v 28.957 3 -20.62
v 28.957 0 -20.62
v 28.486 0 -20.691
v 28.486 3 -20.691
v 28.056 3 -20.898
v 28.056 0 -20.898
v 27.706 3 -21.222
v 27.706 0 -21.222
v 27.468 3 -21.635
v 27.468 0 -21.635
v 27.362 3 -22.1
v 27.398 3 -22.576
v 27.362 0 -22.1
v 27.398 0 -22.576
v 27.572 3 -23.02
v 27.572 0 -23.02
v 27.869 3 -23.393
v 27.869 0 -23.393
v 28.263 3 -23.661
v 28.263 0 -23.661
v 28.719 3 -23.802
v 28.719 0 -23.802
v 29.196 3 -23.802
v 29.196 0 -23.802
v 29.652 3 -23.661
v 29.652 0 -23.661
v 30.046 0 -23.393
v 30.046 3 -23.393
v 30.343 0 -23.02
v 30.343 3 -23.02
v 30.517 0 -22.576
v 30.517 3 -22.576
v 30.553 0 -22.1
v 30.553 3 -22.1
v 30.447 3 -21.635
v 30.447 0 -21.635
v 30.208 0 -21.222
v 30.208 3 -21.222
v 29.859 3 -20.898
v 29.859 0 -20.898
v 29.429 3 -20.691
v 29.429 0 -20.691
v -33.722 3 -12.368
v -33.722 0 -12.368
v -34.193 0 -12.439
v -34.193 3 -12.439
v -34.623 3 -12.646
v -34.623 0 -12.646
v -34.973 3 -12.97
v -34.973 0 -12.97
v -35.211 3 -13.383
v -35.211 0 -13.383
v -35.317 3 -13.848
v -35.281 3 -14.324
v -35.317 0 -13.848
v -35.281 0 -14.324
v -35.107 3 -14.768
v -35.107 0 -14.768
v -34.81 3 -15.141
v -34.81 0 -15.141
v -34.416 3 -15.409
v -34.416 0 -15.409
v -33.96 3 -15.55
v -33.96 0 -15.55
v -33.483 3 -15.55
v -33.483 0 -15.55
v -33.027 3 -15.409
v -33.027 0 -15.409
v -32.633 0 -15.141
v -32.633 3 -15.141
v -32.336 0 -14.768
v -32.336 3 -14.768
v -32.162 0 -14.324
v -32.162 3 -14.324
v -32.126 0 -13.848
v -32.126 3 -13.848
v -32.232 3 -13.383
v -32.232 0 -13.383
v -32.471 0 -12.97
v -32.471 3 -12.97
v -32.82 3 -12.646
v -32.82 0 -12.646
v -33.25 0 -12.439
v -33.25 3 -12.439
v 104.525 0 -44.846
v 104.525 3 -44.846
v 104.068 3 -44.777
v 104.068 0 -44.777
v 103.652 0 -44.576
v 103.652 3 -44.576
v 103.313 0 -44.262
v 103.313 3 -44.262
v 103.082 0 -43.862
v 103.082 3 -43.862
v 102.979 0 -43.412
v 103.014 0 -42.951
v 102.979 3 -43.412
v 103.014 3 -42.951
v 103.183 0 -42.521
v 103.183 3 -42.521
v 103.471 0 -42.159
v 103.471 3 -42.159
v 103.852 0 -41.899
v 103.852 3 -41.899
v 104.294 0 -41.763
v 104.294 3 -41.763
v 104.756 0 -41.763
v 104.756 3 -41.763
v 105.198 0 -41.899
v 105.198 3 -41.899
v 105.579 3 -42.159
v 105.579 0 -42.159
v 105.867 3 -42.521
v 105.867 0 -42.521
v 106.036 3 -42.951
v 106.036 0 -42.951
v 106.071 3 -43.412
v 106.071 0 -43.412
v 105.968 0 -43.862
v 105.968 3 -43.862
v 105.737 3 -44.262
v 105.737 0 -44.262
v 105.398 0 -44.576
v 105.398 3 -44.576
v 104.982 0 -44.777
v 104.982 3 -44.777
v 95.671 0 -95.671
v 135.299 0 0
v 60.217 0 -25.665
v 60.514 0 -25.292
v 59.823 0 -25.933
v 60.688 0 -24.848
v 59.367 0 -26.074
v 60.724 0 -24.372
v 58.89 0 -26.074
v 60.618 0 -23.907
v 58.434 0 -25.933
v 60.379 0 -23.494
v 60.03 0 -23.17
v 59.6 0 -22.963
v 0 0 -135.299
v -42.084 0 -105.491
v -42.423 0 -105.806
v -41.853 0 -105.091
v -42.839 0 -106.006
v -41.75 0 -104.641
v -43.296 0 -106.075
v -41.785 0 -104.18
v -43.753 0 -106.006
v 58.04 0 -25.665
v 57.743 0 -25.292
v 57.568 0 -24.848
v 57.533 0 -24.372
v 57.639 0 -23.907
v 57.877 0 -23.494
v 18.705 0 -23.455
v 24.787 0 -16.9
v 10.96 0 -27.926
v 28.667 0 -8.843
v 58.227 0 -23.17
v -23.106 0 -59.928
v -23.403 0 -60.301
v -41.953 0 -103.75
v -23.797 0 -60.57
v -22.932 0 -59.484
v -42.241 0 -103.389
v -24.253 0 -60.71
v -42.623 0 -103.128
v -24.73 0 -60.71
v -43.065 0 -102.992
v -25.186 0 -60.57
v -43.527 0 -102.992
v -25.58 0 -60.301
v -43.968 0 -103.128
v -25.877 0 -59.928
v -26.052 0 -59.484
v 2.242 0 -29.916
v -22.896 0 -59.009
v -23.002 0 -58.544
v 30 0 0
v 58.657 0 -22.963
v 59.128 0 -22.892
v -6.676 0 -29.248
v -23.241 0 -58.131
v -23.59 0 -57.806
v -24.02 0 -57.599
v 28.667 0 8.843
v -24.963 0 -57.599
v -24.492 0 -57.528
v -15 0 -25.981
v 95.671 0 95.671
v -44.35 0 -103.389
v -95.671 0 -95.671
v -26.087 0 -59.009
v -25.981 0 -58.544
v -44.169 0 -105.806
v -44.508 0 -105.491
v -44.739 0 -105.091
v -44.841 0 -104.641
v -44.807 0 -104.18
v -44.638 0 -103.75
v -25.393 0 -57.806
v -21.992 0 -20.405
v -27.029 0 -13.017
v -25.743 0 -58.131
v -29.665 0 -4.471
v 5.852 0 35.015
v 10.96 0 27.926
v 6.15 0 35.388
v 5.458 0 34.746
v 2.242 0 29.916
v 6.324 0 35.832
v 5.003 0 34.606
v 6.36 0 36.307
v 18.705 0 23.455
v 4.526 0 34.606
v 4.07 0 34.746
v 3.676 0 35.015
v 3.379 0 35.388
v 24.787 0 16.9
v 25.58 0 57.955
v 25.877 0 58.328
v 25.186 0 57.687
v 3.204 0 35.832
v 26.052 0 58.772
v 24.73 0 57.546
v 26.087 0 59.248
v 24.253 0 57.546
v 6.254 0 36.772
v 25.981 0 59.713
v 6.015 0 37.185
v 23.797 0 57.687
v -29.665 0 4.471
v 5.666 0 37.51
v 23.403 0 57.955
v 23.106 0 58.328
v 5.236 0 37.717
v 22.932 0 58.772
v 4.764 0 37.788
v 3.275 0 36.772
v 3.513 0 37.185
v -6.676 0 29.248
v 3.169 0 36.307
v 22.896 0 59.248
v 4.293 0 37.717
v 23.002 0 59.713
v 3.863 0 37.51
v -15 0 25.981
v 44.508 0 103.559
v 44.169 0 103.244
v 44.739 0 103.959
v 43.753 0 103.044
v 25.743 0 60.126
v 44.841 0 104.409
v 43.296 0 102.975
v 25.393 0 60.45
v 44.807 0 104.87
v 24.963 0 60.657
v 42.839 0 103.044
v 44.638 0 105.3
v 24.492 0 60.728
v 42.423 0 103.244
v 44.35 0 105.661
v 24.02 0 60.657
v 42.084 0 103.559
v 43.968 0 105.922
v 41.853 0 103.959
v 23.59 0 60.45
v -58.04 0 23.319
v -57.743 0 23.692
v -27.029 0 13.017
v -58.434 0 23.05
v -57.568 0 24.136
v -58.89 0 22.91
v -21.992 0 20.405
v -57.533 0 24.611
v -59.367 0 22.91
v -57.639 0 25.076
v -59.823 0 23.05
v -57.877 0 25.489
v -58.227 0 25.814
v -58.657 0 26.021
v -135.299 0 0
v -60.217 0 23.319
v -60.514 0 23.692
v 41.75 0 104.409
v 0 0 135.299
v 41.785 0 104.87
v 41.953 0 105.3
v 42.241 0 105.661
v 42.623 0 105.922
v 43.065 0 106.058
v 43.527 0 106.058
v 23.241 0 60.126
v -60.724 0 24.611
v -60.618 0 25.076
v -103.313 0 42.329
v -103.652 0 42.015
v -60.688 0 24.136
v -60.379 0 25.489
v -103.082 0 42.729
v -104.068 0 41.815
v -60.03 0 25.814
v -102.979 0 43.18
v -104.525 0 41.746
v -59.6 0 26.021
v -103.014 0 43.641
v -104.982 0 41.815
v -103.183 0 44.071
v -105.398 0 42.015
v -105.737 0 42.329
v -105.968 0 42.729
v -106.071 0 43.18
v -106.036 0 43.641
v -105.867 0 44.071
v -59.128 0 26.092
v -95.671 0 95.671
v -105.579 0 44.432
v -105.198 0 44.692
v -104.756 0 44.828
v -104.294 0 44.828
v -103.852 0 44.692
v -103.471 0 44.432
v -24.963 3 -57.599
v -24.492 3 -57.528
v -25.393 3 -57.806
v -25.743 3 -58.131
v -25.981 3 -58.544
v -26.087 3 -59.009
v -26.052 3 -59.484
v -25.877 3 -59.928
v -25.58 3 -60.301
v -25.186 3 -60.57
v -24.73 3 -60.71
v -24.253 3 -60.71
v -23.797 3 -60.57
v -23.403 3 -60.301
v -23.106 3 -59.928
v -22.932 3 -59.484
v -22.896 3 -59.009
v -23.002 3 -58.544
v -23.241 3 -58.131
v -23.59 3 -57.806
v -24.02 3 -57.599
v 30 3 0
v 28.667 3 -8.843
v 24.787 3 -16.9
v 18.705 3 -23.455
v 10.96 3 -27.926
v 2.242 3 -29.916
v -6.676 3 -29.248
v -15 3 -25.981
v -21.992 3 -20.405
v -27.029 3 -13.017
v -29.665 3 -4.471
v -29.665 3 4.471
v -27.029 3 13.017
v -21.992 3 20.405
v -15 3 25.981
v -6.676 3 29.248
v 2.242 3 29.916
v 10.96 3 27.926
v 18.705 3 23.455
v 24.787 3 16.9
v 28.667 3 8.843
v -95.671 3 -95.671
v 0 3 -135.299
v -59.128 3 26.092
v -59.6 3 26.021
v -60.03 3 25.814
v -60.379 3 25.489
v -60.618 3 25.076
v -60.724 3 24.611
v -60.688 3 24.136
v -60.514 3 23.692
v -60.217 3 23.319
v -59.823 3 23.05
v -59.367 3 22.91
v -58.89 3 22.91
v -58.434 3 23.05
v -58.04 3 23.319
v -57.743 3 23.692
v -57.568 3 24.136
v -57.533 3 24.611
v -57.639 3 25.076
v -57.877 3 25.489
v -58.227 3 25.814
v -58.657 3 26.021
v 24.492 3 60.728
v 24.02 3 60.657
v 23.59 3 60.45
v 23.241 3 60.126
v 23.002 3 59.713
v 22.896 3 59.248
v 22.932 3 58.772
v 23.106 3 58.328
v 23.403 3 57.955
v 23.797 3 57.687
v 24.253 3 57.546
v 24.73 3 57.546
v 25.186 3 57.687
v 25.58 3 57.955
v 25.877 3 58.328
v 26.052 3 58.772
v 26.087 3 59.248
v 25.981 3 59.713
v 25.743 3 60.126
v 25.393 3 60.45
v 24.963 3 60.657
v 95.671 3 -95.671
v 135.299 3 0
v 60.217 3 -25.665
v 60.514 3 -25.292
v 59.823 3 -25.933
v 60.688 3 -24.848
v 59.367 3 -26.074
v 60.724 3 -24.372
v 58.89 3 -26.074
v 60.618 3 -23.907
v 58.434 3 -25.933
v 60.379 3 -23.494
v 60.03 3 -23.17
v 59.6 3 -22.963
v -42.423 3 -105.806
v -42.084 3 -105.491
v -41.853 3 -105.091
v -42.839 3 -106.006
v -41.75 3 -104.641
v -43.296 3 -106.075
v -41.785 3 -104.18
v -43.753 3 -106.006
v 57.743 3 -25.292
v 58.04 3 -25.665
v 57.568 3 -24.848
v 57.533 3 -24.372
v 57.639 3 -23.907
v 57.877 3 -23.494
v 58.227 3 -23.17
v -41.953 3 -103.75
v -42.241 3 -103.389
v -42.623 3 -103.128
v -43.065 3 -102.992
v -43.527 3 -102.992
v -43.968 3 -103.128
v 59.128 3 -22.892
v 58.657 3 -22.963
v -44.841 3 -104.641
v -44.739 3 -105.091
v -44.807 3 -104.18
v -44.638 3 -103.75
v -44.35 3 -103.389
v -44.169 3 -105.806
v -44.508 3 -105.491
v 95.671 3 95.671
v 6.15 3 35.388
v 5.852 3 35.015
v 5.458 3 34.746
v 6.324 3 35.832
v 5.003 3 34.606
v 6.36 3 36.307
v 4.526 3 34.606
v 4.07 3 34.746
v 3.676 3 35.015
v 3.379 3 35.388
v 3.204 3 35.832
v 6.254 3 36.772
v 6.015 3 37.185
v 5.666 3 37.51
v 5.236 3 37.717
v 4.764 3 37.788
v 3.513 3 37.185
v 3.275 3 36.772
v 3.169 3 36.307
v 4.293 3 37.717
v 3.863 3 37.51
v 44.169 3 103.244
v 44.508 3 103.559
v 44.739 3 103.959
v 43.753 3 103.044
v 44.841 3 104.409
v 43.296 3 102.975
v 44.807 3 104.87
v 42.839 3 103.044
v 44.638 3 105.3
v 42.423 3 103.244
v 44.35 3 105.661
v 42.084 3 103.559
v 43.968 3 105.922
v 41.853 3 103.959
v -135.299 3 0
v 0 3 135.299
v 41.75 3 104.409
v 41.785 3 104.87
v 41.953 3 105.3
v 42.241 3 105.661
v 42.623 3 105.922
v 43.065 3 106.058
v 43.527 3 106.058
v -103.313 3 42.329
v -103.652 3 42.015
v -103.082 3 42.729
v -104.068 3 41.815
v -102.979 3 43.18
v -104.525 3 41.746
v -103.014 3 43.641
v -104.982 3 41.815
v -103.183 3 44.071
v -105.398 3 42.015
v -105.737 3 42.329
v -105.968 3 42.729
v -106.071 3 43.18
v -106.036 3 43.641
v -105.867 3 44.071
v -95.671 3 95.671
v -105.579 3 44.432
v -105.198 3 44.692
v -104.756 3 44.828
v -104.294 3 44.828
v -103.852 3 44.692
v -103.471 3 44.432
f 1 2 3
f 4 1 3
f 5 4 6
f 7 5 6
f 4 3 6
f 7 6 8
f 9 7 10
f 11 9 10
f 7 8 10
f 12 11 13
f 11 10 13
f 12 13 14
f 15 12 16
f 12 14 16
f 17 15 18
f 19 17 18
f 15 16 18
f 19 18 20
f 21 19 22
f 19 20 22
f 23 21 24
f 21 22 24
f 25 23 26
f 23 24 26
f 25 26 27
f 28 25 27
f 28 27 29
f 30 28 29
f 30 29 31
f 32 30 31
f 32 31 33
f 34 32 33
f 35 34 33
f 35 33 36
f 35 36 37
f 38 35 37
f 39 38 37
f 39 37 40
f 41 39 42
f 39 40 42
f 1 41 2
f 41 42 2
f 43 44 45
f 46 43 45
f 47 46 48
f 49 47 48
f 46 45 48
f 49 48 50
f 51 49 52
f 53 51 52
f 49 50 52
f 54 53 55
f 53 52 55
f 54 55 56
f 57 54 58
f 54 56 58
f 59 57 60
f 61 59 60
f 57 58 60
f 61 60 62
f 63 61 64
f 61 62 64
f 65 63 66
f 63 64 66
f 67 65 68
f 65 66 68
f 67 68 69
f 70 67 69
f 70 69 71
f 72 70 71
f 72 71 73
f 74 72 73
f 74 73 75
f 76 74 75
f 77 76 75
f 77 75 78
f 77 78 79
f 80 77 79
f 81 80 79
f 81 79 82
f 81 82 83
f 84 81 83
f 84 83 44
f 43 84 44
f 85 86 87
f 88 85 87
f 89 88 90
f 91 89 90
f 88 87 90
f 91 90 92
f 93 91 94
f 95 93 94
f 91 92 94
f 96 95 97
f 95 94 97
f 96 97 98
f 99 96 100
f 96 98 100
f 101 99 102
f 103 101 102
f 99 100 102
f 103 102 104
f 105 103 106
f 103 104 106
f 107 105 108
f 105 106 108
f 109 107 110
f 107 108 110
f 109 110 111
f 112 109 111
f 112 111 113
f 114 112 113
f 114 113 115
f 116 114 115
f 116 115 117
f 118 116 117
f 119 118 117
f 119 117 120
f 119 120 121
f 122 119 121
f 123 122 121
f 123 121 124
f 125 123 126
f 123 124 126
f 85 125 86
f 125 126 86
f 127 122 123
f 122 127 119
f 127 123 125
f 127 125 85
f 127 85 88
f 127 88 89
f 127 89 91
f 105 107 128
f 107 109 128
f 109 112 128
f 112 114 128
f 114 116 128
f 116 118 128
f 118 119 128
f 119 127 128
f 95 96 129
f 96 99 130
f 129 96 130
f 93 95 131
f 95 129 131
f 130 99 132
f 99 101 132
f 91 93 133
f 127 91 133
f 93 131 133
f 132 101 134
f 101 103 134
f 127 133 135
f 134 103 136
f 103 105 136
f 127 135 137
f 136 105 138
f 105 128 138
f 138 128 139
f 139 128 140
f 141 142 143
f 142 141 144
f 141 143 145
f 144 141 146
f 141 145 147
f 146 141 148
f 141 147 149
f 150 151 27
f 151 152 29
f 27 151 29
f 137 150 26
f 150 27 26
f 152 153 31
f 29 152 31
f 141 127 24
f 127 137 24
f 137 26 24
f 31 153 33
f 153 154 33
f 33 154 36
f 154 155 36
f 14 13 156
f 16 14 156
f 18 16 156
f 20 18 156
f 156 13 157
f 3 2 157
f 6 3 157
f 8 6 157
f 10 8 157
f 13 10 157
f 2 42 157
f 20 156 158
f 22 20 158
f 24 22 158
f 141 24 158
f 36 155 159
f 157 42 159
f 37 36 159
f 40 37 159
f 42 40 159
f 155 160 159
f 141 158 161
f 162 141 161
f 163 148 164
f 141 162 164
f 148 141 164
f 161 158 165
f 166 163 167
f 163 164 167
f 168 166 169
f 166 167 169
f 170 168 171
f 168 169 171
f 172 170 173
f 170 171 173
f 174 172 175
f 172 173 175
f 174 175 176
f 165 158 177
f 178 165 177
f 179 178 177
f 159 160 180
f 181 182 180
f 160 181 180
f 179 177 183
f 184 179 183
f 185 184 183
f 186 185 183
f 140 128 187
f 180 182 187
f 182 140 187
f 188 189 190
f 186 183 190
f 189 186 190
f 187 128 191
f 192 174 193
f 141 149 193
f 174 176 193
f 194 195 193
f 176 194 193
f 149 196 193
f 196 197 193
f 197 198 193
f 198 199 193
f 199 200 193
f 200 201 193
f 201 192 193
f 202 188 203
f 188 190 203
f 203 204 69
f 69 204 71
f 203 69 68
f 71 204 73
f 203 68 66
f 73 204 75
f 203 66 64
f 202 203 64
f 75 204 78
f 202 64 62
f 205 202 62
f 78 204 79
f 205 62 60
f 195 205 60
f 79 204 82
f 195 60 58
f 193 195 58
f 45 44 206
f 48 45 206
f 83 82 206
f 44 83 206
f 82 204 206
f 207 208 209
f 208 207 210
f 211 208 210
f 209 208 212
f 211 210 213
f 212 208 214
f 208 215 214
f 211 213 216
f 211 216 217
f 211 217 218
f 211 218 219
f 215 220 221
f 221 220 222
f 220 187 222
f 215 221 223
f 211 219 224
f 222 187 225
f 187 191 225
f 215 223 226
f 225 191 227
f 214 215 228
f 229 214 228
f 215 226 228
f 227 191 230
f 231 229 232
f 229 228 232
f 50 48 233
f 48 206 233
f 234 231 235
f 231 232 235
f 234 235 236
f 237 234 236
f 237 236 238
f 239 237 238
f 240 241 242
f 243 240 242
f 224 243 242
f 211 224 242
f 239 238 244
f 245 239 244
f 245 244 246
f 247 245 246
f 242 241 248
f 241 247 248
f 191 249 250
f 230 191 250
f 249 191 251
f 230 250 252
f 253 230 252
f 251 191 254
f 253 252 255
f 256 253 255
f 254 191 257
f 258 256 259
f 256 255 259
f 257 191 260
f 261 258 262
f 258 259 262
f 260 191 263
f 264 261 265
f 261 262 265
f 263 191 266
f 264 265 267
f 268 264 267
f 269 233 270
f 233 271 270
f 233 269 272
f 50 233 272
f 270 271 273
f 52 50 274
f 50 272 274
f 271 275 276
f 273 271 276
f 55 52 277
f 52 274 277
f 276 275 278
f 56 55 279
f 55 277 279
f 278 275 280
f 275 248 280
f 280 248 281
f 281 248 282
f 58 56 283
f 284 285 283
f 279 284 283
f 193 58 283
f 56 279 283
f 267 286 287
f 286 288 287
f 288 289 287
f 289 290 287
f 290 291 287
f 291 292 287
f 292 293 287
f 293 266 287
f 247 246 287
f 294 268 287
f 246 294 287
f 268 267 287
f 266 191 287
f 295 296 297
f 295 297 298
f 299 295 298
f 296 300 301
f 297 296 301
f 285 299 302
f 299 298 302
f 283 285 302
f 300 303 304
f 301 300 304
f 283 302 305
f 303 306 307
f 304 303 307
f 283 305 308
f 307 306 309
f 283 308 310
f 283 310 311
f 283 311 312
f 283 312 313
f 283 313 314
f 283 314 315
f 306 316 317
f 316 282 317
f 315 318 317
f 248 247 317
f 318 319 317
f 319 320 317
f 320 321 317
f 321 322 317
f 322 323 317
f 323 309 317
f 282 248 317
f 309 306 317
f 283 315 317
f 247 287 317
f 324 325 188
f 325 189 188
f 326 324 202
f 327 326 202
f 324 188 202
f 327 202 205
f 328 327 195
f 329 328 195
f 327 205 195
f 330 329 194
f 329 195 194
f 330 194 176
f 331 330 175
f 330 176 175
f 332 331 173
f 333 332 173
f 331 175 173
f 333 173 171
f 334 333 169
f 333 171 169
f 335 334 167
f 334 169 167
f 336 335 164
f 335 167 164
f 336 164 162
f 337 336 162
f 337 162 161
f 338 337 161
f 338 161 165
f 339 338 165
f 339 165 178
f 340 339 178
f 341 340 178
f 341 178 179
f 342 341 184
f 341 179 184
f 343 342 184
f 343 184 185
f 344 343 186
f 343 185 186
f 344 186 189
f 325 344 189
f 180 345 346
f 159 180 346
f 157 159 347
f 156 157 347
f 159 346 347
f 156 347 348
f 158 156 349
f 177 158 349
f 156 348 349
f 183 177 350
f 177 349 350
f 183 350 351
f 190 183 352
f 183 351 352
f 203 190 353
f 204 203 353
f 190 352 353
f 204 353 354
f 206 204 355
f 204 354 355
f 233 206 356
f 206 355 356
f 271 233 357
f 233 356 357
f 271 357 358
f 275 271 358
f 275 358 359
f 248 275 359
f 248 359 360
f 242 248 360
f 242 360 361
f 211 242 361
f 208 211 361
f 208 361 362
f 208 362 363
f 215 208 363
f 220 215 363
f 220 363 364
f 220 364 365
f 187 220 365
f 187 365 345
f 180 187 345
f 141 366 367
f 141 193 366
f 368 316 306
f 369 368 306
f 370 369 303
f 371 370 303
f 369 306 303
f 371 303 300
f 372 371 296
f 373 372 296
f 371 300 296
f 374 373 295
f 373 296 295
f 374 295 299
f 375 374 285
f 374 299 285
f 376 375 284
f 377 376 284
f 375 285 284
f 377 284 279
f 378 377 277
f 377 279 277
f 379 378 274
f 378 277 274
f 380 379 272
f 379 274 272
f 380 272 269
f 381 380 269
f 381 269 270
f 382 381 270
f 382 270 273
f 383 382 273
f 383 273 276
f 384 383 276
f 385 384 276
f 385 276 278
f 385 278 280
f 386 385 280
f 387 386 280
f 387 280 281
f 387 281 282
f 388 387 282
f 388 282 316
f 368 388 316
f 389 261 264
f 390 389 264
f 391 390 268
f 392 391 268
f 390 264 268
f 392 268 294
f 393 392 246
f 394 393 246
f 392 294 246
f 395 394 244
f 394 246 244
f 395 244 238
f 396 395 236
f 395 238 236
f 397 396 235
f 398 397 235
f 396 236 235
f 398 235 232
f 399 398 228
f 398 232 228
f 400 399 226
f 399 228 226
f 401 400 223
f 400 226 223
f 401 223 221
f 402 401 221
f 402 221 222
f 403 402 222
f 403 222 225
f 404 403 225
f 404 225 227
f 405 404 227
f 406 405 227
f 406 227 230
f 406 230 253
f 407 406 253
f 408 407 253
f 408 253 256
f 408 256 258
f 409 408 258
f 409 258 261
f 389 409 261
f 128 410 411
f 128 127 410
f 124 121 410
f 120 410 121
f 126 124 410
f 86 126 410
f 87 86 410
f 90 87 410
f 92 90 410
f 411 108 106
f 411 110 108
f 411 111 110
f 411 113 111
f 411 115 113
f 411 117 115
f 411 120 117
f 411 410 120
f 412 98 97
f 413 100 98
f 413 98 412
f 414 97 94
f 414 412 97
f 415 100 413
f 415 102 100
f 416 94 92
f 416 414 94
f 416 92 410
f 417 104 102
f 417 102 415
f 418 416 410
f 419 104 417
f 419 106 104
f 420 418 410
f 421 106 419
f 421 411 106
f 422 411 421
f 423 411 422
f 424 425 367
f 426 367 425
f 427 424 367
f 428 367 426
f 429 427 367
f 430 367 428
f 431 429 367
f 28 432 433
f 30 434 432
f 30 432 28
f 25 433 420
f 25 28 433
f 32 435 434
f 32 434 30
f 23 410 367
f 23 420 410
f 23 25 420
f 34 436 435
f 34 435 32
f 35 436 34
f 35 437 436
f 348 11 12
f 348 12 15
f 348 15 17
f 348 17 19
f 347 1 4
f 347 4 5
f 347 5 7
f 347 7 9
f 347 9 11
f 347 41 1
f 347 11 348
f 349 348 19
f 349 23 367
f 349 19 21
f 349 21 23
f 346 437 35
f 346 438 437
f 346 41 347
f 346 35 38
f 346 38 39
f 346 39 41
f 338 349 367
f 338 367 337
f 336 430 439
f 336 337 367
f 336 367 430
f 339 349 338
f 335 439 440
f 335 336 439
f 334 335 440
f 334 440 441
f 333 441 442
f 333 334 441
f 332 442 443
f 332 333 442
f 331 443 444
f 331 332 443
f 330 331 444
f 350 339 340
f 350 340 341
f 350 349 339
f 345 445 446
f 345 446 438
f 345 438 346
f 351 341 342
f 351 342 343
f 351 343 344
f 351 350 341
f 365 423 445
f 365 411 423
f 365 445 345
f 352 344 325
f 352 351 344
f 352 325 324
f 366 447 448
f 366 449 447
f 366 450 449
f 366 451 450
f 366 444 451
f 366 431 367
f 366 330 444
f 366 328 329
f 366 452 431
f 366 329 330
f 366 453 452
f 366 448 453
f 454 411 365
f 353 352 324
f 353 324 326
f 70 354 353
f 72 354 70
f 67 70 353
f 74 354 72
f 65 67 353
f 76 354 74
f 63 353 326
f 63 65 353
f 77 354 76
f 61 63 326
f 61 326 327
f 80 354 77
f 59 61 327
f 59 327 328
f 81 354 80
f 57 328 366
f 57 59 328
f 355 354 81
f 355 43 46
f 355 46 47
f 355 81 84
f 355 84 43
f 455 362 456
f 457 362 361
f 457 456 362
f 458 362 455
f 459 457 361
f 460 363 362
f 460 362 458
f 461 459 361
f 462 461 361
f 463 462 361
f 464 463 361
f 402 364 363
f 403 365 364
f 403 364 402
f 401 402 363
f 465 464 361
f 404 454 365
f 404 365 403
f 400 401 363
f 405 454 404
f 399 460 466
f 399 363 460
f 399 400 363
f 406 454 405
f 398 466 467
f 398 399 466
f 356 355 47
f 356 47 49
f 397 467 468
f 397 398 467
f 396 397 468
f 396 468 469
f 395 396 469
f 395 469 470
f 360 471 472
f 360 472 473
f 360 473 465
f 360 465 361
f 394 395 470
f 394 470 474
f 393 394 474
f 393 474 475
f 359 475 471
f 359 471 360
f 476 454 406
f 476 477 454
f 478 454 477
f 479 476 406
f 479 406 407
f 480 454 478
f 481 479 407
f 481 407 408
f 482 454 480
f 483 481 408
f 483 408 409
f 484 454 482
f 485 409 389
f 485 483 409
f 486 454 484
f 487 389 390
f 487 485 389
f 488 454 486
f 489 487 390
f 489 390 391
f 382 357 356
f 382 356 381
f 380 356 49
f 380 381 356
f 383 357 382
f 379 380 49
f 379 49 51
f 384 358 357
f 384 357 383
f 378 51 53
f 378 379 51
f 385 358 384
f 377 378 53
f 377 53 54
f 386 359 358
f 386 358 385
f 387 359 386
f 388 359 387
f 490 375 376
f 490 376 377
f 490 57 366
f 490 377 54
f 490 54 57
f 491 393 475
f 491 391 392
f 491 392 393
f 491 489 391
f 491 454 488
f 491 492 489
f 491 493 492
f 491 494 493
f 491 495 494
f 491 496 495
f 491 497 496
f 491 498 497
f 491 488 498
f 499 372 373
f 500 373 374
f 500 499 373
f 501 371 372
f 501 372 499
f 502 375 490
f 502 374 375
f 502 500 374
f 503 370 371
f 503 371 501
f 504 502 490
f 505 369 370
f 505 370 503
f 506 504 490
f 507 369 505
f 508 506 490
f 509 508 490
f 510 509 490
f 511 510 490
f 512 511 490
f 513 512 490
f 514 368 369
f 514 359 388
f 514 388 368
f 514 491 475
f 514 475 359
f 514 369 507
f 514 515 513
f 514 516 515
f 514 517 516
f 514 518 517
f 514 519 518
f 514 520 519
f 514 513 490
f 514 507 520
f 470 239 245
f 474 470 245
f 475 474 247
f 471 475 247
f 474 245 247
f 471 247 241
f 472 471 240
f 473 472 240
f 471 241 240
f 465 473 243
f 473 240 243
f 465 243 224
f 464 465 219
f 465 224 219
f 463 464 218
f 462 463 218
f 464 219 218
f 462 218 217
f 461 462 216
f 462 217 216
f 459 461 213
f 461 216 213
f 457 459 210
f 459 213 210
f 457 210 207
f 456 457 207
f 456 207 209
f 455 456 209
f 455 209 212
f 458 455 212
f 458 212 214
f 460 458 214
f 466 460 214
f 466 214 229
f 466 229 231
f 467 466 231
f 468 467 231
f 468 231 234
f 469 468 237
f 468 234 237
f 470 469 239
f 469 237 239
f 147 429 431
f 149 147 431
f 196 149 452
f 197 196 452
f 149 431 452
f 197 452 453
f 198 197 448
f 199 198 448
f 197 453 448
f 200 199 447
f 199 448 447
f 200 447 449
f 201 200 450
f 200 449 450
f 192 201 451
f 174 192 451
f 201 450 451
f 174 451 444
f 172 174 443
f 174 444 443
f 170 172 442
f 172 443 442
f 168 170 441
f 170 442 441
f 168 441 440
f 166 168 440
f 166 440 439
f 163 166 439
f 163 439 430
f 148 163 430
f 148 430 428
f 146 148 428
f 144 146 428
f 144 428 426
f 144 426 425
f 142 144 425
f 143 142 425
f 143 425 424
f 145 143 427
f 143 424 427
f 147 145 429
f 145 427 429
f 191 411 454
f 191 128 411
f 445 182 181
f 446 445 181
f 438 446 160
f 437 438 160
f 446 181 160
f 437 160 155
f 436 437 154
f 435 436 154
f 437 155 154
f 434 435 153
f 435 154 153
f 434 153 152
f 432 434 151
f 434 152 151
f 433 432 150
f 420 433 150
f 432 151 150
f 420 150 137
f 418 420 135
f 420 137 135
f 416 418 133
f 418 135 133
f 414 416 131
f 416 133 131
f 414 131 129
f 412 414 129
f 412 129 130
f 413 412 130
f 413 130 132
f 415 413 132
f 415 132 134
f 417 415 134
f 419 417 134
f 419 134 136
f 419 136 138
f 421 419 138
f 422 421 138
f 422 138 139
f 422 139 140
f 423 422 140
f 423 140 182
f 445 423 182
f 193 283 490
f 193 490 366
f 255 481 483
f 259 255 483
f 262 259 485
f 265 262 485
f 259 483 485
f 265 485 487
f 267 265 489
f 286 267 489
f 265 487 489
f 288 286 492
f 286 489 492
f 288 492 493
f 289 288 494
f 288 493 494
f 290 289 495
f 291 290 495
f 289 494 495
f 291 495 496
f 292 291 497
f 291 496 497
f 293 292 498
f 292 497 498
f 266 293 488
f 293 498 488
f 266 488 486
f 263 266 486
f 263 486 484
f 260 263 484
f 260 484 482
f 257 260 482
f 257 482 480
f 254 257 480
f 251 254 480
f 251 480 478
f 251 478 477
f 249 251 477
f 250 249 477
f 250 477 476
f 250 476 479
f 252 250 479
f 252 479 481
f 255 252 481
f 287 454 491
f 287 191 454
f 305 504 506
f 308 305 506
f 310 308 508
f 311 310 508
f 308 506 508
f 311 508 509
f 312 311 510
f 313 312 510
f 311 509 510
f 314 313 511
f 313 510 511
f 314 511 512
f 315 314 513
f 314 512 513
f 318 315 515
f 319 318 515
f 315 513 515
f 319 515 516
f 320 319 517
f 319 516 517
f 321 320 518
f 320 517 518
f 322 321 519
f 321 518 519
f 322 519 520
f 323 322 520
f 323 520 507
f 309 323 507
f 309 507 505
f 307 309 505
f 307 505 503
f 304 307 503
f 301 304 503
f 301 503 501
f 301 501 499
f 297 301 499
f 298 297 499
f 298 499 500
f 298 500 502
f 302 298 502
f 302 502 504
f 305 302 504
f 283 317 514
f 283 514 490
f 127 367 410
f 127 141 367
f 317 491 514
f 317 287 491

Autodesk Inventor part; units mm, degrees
ref_plane "YZ Plane" through (0, 0, 0) normal (1, 0, 0) x (0, 1, 0)
ref_plane "XZ Plane" through (0, 0, 0) normal (0, 1, 0) x (-1, 0, 0)
ref_plane "XY Plane" through (0, 0, 0) normal (0, 0, 1) x (1, 0, 0)
sketch "スケッチ1" plane through (0, 0, 0) normal (0, 1, 0) x (-1, 0, 0)
  circle A0 centre (0, 0) radius 135.299
  line L0 (0, 0) -> (135.299, 0)
  line L1 (0, 0) -> (95.6709, -95.6709)
  line L2 (0, 0) -> (0, -135.299)
  line L3 (0, 0) -> (-95.6709, -95.6709)
  line L4 (0, 0) -> (-135.299, 0)
  line L5 (0, 0) -> (-95.6709, 95.6709)
  line L6 (0, 0) -> (0, 135.299)
  line L7 (0, 0) -> (95.6709, 95.6709)
  line L8 (135.299, 0) -> (95.6709, -95.6709)
  line L9 (95.6709, 95.6709) -> (135.299, 0)
  line L10 (0, 135.299) -> (95.6709, 95.6709)
  line L11 (-95.6709, 95.6709) -> (0, 135.299)
  line L12 (-135.299, 0) -> (-95.6709, 95.6709)
  line L13 (-95.6709, -95.6709) -> (-135.299, 0)
  line L14 (0, -135.299) -> (-95.6709, -95.6709)
  line L15 (95.6709, -95.6709) -> (0, -135.299)
  circle A1 centre (0, 0) radius 125
  point P0 (0, 135.299)
  point P1 (-95.6709, 95.6709)
  point P2 (-135.299, 0)
  point P3 (95.6709, -95.6709)
  dimension "d3" = 360
  dimension "d7" = 360
  dimension "d57" = 250
extrude "押し出し1" add sketch "スケッチ1" along normal blind 3 contours L8 A1 L0 | L0 A1 L9 | L9 A1 L7 | L7 A1 L10 | L15 A1 L1 | L1 A1 L8 | A1 L1 L0 | L0 L7 A1 | L10 A1 L6 | L6 A1 L11 | L7 L6 A1 | L14 A1 L2 | L2 A1 L15 | A1 L2 L1 | L2 A1 L3 | L3 A1 L4 | L4 A1 L5 | L5 A1 L6 | L11 A1 L5 | L5 A1 L12 | L13 A1 L3 | L3 A1 L14 | A1 L13 L4 | L4 L12 A1
sketch "スケッチ2" plane through (0, 3, 0) normal (0, 1, 0) x (1, 0, 0)
  circle A0 centre (0, 0) radius 64
  circle A1 centre (0, 0) radius 36.5
  line L0 (0, 0) -> (-59.1283, 24.4917)
  line L1 (-95.6709, 95.6709) -> (-135.299, 0) projected
  line L2 (0, 0) -> (-135.299, 0)
  point P0 (-33.7216, 13.9679)
  point P1 (4.7642, -36.1877)
  point P2 (28.9574, 22.2198)
  dimension "d11" = 128
  dimension "d12" = 73
  dimension "d13" = 22.5
  dimension "d16" = 360
hole "穴1" at (-33.7216, 3, -13.9679) at (4.7642, 3, 36.1877) at (28.9574, 3, -22.2198) direction (0, -1, 0) diameter 3.2 end through all
sketch "スケッチ3" plane through (0, 3, 0) normal (0, 1, 0) x (1, 0, 0)
  circle A0 centre (0, 0) radius 64
  line L0 (0, 0) -> (-59.1283, -24.4917)
  line L1 (0, 0) -> (-29.4133, 0)
  point P0 (-59.1283, -24.4917)
  point P1 (24.4917, -59.1283)
  point P2 (59.1283, 24.4917)
  point P3 (-24.4917, 59.1283)
  dimension "d25" = 128
  dimension "d28" = 360
  dimension "d56" = 22.5
hole "穴2" at (-59.1283, 3, 24.4917) at (24.4917, 3, 59.1283) at (59.1283, 3, -24.4917) at (-24.4917, 3, -59.1283) direction (0, -1, 0) diameter 3.2 end through all
sketch "スケッチ4" plane through (0, 0, 0) normal (0, -1, 0) x (1, 0, 0)
  circle A0 centre (-33.7216, -13.9679) radius 1.6 projected
  circle A1 centre (-33.7216, -13.9679) radius 3
  circle A2 centre (28.9574, -22.2198) radius 3
  circle A3 centre (4.7642, 36.1877) radius 3
  circle A4 centre (-24.4917, -59.1283) radius 1.6 projected
  circle A5 centre (-24.4917, -59.1283) radius 3.9
  circle A6 centre (59.1283, -24.4917) radius 3.9
  circle A7 centre (24.4917, 59.1283) radius 3.9
  circle A8 centre (-59.1283, 24.4917) radius 3.9
  point P0 (0, 0)
  point P1 (0, 0)
  point P2 (0, 0)
  dimension "d37" = 6
  dimension "d40" = 360
  dimension "d42" = 7.8
  dimension "d45" = 360
extrude "押し出し2" [suppressed]
sketch "スケッチ5" plane through (0, 0, 0) normal (0, -1, 0) x (1, 0, 0)
  circle A0 centre (59.1283, -24.4917) radius 1.6 projected
  circle A1 centre (59.1283, -24.4917) radius 3.9
  circle A2 centre (24.4917, 59.1283) radius 3.9
  circle A3 centre (-59.1283, 24.4917) radius 3.9
  circle A4 centre (-24.4917, -59.1283) radius 3.9
  point P0 (0, 0)
  dimension "d49" = 7.8
  dimension "d52" = 360
extrude "押し出し3" [suppressed]
sketch "スケッチ6" plane through (0, 0, 0) normal (0, -1, 0) x (1, 0, 0)
  line L0 (0, 0) -> (115.4849, 47.8354)
  line L1 (95.6709, 95.6709) -> (135.299, 0) projected
  line L2 (0, 135.299) -> (95.6709, 95.6709) projected
  line L3 (58.7953, 110.9452) -> (-120.0247, 36.8755)
  line L4 (-135.299, 0) -> (-95.6709, 95.6709) projected
  line L5 (-95.6709, 95.6709) -> (0, 135.299) projected
  line L6 (135.299, 0) -> (95.6709, -95.6709) projected
  line L7 (120.0247, -36.8755) -> (-58.7953, -110.9452)
  line L8 (0, -135.299) -> (-95.6709, -95.6709) projected
  line L9 (95.6709, -95.6709) -> (0, -135.299) projected
  line L10 (0, 0) -> (-30.6147, 73.9104)
  point P0 (43.2957, 104.525)
  point P1 (-104.525, 43.2957)
  point P2 (104.525, -43.2957)
  point P3 (-43.2957, -104.525)
  dimension "d58" = 80
  dimension "d59" = 80
  dimension "d60" = 80
hole "穴3" at (43.2957, 0, 104.525) at (-104.525, 0, 43.2957) at (104.525, 0, -43.2957) at (-43.2957, 0, -104.525) direction (0, 1, 0) diameter 3.1 end through all
sketch "スケッチ7" plane through (0, 3, 0) normal (0, 1, 0) x (1, 0, 0)
  circle A0 centre (0, 0) radius 30
  dimension "d68" = 60
extrude "押し出し4" cut sketch "スケッチ7" against normal blind 10
properties part number "Largebaseplate" material "アルミニウム 6061"
